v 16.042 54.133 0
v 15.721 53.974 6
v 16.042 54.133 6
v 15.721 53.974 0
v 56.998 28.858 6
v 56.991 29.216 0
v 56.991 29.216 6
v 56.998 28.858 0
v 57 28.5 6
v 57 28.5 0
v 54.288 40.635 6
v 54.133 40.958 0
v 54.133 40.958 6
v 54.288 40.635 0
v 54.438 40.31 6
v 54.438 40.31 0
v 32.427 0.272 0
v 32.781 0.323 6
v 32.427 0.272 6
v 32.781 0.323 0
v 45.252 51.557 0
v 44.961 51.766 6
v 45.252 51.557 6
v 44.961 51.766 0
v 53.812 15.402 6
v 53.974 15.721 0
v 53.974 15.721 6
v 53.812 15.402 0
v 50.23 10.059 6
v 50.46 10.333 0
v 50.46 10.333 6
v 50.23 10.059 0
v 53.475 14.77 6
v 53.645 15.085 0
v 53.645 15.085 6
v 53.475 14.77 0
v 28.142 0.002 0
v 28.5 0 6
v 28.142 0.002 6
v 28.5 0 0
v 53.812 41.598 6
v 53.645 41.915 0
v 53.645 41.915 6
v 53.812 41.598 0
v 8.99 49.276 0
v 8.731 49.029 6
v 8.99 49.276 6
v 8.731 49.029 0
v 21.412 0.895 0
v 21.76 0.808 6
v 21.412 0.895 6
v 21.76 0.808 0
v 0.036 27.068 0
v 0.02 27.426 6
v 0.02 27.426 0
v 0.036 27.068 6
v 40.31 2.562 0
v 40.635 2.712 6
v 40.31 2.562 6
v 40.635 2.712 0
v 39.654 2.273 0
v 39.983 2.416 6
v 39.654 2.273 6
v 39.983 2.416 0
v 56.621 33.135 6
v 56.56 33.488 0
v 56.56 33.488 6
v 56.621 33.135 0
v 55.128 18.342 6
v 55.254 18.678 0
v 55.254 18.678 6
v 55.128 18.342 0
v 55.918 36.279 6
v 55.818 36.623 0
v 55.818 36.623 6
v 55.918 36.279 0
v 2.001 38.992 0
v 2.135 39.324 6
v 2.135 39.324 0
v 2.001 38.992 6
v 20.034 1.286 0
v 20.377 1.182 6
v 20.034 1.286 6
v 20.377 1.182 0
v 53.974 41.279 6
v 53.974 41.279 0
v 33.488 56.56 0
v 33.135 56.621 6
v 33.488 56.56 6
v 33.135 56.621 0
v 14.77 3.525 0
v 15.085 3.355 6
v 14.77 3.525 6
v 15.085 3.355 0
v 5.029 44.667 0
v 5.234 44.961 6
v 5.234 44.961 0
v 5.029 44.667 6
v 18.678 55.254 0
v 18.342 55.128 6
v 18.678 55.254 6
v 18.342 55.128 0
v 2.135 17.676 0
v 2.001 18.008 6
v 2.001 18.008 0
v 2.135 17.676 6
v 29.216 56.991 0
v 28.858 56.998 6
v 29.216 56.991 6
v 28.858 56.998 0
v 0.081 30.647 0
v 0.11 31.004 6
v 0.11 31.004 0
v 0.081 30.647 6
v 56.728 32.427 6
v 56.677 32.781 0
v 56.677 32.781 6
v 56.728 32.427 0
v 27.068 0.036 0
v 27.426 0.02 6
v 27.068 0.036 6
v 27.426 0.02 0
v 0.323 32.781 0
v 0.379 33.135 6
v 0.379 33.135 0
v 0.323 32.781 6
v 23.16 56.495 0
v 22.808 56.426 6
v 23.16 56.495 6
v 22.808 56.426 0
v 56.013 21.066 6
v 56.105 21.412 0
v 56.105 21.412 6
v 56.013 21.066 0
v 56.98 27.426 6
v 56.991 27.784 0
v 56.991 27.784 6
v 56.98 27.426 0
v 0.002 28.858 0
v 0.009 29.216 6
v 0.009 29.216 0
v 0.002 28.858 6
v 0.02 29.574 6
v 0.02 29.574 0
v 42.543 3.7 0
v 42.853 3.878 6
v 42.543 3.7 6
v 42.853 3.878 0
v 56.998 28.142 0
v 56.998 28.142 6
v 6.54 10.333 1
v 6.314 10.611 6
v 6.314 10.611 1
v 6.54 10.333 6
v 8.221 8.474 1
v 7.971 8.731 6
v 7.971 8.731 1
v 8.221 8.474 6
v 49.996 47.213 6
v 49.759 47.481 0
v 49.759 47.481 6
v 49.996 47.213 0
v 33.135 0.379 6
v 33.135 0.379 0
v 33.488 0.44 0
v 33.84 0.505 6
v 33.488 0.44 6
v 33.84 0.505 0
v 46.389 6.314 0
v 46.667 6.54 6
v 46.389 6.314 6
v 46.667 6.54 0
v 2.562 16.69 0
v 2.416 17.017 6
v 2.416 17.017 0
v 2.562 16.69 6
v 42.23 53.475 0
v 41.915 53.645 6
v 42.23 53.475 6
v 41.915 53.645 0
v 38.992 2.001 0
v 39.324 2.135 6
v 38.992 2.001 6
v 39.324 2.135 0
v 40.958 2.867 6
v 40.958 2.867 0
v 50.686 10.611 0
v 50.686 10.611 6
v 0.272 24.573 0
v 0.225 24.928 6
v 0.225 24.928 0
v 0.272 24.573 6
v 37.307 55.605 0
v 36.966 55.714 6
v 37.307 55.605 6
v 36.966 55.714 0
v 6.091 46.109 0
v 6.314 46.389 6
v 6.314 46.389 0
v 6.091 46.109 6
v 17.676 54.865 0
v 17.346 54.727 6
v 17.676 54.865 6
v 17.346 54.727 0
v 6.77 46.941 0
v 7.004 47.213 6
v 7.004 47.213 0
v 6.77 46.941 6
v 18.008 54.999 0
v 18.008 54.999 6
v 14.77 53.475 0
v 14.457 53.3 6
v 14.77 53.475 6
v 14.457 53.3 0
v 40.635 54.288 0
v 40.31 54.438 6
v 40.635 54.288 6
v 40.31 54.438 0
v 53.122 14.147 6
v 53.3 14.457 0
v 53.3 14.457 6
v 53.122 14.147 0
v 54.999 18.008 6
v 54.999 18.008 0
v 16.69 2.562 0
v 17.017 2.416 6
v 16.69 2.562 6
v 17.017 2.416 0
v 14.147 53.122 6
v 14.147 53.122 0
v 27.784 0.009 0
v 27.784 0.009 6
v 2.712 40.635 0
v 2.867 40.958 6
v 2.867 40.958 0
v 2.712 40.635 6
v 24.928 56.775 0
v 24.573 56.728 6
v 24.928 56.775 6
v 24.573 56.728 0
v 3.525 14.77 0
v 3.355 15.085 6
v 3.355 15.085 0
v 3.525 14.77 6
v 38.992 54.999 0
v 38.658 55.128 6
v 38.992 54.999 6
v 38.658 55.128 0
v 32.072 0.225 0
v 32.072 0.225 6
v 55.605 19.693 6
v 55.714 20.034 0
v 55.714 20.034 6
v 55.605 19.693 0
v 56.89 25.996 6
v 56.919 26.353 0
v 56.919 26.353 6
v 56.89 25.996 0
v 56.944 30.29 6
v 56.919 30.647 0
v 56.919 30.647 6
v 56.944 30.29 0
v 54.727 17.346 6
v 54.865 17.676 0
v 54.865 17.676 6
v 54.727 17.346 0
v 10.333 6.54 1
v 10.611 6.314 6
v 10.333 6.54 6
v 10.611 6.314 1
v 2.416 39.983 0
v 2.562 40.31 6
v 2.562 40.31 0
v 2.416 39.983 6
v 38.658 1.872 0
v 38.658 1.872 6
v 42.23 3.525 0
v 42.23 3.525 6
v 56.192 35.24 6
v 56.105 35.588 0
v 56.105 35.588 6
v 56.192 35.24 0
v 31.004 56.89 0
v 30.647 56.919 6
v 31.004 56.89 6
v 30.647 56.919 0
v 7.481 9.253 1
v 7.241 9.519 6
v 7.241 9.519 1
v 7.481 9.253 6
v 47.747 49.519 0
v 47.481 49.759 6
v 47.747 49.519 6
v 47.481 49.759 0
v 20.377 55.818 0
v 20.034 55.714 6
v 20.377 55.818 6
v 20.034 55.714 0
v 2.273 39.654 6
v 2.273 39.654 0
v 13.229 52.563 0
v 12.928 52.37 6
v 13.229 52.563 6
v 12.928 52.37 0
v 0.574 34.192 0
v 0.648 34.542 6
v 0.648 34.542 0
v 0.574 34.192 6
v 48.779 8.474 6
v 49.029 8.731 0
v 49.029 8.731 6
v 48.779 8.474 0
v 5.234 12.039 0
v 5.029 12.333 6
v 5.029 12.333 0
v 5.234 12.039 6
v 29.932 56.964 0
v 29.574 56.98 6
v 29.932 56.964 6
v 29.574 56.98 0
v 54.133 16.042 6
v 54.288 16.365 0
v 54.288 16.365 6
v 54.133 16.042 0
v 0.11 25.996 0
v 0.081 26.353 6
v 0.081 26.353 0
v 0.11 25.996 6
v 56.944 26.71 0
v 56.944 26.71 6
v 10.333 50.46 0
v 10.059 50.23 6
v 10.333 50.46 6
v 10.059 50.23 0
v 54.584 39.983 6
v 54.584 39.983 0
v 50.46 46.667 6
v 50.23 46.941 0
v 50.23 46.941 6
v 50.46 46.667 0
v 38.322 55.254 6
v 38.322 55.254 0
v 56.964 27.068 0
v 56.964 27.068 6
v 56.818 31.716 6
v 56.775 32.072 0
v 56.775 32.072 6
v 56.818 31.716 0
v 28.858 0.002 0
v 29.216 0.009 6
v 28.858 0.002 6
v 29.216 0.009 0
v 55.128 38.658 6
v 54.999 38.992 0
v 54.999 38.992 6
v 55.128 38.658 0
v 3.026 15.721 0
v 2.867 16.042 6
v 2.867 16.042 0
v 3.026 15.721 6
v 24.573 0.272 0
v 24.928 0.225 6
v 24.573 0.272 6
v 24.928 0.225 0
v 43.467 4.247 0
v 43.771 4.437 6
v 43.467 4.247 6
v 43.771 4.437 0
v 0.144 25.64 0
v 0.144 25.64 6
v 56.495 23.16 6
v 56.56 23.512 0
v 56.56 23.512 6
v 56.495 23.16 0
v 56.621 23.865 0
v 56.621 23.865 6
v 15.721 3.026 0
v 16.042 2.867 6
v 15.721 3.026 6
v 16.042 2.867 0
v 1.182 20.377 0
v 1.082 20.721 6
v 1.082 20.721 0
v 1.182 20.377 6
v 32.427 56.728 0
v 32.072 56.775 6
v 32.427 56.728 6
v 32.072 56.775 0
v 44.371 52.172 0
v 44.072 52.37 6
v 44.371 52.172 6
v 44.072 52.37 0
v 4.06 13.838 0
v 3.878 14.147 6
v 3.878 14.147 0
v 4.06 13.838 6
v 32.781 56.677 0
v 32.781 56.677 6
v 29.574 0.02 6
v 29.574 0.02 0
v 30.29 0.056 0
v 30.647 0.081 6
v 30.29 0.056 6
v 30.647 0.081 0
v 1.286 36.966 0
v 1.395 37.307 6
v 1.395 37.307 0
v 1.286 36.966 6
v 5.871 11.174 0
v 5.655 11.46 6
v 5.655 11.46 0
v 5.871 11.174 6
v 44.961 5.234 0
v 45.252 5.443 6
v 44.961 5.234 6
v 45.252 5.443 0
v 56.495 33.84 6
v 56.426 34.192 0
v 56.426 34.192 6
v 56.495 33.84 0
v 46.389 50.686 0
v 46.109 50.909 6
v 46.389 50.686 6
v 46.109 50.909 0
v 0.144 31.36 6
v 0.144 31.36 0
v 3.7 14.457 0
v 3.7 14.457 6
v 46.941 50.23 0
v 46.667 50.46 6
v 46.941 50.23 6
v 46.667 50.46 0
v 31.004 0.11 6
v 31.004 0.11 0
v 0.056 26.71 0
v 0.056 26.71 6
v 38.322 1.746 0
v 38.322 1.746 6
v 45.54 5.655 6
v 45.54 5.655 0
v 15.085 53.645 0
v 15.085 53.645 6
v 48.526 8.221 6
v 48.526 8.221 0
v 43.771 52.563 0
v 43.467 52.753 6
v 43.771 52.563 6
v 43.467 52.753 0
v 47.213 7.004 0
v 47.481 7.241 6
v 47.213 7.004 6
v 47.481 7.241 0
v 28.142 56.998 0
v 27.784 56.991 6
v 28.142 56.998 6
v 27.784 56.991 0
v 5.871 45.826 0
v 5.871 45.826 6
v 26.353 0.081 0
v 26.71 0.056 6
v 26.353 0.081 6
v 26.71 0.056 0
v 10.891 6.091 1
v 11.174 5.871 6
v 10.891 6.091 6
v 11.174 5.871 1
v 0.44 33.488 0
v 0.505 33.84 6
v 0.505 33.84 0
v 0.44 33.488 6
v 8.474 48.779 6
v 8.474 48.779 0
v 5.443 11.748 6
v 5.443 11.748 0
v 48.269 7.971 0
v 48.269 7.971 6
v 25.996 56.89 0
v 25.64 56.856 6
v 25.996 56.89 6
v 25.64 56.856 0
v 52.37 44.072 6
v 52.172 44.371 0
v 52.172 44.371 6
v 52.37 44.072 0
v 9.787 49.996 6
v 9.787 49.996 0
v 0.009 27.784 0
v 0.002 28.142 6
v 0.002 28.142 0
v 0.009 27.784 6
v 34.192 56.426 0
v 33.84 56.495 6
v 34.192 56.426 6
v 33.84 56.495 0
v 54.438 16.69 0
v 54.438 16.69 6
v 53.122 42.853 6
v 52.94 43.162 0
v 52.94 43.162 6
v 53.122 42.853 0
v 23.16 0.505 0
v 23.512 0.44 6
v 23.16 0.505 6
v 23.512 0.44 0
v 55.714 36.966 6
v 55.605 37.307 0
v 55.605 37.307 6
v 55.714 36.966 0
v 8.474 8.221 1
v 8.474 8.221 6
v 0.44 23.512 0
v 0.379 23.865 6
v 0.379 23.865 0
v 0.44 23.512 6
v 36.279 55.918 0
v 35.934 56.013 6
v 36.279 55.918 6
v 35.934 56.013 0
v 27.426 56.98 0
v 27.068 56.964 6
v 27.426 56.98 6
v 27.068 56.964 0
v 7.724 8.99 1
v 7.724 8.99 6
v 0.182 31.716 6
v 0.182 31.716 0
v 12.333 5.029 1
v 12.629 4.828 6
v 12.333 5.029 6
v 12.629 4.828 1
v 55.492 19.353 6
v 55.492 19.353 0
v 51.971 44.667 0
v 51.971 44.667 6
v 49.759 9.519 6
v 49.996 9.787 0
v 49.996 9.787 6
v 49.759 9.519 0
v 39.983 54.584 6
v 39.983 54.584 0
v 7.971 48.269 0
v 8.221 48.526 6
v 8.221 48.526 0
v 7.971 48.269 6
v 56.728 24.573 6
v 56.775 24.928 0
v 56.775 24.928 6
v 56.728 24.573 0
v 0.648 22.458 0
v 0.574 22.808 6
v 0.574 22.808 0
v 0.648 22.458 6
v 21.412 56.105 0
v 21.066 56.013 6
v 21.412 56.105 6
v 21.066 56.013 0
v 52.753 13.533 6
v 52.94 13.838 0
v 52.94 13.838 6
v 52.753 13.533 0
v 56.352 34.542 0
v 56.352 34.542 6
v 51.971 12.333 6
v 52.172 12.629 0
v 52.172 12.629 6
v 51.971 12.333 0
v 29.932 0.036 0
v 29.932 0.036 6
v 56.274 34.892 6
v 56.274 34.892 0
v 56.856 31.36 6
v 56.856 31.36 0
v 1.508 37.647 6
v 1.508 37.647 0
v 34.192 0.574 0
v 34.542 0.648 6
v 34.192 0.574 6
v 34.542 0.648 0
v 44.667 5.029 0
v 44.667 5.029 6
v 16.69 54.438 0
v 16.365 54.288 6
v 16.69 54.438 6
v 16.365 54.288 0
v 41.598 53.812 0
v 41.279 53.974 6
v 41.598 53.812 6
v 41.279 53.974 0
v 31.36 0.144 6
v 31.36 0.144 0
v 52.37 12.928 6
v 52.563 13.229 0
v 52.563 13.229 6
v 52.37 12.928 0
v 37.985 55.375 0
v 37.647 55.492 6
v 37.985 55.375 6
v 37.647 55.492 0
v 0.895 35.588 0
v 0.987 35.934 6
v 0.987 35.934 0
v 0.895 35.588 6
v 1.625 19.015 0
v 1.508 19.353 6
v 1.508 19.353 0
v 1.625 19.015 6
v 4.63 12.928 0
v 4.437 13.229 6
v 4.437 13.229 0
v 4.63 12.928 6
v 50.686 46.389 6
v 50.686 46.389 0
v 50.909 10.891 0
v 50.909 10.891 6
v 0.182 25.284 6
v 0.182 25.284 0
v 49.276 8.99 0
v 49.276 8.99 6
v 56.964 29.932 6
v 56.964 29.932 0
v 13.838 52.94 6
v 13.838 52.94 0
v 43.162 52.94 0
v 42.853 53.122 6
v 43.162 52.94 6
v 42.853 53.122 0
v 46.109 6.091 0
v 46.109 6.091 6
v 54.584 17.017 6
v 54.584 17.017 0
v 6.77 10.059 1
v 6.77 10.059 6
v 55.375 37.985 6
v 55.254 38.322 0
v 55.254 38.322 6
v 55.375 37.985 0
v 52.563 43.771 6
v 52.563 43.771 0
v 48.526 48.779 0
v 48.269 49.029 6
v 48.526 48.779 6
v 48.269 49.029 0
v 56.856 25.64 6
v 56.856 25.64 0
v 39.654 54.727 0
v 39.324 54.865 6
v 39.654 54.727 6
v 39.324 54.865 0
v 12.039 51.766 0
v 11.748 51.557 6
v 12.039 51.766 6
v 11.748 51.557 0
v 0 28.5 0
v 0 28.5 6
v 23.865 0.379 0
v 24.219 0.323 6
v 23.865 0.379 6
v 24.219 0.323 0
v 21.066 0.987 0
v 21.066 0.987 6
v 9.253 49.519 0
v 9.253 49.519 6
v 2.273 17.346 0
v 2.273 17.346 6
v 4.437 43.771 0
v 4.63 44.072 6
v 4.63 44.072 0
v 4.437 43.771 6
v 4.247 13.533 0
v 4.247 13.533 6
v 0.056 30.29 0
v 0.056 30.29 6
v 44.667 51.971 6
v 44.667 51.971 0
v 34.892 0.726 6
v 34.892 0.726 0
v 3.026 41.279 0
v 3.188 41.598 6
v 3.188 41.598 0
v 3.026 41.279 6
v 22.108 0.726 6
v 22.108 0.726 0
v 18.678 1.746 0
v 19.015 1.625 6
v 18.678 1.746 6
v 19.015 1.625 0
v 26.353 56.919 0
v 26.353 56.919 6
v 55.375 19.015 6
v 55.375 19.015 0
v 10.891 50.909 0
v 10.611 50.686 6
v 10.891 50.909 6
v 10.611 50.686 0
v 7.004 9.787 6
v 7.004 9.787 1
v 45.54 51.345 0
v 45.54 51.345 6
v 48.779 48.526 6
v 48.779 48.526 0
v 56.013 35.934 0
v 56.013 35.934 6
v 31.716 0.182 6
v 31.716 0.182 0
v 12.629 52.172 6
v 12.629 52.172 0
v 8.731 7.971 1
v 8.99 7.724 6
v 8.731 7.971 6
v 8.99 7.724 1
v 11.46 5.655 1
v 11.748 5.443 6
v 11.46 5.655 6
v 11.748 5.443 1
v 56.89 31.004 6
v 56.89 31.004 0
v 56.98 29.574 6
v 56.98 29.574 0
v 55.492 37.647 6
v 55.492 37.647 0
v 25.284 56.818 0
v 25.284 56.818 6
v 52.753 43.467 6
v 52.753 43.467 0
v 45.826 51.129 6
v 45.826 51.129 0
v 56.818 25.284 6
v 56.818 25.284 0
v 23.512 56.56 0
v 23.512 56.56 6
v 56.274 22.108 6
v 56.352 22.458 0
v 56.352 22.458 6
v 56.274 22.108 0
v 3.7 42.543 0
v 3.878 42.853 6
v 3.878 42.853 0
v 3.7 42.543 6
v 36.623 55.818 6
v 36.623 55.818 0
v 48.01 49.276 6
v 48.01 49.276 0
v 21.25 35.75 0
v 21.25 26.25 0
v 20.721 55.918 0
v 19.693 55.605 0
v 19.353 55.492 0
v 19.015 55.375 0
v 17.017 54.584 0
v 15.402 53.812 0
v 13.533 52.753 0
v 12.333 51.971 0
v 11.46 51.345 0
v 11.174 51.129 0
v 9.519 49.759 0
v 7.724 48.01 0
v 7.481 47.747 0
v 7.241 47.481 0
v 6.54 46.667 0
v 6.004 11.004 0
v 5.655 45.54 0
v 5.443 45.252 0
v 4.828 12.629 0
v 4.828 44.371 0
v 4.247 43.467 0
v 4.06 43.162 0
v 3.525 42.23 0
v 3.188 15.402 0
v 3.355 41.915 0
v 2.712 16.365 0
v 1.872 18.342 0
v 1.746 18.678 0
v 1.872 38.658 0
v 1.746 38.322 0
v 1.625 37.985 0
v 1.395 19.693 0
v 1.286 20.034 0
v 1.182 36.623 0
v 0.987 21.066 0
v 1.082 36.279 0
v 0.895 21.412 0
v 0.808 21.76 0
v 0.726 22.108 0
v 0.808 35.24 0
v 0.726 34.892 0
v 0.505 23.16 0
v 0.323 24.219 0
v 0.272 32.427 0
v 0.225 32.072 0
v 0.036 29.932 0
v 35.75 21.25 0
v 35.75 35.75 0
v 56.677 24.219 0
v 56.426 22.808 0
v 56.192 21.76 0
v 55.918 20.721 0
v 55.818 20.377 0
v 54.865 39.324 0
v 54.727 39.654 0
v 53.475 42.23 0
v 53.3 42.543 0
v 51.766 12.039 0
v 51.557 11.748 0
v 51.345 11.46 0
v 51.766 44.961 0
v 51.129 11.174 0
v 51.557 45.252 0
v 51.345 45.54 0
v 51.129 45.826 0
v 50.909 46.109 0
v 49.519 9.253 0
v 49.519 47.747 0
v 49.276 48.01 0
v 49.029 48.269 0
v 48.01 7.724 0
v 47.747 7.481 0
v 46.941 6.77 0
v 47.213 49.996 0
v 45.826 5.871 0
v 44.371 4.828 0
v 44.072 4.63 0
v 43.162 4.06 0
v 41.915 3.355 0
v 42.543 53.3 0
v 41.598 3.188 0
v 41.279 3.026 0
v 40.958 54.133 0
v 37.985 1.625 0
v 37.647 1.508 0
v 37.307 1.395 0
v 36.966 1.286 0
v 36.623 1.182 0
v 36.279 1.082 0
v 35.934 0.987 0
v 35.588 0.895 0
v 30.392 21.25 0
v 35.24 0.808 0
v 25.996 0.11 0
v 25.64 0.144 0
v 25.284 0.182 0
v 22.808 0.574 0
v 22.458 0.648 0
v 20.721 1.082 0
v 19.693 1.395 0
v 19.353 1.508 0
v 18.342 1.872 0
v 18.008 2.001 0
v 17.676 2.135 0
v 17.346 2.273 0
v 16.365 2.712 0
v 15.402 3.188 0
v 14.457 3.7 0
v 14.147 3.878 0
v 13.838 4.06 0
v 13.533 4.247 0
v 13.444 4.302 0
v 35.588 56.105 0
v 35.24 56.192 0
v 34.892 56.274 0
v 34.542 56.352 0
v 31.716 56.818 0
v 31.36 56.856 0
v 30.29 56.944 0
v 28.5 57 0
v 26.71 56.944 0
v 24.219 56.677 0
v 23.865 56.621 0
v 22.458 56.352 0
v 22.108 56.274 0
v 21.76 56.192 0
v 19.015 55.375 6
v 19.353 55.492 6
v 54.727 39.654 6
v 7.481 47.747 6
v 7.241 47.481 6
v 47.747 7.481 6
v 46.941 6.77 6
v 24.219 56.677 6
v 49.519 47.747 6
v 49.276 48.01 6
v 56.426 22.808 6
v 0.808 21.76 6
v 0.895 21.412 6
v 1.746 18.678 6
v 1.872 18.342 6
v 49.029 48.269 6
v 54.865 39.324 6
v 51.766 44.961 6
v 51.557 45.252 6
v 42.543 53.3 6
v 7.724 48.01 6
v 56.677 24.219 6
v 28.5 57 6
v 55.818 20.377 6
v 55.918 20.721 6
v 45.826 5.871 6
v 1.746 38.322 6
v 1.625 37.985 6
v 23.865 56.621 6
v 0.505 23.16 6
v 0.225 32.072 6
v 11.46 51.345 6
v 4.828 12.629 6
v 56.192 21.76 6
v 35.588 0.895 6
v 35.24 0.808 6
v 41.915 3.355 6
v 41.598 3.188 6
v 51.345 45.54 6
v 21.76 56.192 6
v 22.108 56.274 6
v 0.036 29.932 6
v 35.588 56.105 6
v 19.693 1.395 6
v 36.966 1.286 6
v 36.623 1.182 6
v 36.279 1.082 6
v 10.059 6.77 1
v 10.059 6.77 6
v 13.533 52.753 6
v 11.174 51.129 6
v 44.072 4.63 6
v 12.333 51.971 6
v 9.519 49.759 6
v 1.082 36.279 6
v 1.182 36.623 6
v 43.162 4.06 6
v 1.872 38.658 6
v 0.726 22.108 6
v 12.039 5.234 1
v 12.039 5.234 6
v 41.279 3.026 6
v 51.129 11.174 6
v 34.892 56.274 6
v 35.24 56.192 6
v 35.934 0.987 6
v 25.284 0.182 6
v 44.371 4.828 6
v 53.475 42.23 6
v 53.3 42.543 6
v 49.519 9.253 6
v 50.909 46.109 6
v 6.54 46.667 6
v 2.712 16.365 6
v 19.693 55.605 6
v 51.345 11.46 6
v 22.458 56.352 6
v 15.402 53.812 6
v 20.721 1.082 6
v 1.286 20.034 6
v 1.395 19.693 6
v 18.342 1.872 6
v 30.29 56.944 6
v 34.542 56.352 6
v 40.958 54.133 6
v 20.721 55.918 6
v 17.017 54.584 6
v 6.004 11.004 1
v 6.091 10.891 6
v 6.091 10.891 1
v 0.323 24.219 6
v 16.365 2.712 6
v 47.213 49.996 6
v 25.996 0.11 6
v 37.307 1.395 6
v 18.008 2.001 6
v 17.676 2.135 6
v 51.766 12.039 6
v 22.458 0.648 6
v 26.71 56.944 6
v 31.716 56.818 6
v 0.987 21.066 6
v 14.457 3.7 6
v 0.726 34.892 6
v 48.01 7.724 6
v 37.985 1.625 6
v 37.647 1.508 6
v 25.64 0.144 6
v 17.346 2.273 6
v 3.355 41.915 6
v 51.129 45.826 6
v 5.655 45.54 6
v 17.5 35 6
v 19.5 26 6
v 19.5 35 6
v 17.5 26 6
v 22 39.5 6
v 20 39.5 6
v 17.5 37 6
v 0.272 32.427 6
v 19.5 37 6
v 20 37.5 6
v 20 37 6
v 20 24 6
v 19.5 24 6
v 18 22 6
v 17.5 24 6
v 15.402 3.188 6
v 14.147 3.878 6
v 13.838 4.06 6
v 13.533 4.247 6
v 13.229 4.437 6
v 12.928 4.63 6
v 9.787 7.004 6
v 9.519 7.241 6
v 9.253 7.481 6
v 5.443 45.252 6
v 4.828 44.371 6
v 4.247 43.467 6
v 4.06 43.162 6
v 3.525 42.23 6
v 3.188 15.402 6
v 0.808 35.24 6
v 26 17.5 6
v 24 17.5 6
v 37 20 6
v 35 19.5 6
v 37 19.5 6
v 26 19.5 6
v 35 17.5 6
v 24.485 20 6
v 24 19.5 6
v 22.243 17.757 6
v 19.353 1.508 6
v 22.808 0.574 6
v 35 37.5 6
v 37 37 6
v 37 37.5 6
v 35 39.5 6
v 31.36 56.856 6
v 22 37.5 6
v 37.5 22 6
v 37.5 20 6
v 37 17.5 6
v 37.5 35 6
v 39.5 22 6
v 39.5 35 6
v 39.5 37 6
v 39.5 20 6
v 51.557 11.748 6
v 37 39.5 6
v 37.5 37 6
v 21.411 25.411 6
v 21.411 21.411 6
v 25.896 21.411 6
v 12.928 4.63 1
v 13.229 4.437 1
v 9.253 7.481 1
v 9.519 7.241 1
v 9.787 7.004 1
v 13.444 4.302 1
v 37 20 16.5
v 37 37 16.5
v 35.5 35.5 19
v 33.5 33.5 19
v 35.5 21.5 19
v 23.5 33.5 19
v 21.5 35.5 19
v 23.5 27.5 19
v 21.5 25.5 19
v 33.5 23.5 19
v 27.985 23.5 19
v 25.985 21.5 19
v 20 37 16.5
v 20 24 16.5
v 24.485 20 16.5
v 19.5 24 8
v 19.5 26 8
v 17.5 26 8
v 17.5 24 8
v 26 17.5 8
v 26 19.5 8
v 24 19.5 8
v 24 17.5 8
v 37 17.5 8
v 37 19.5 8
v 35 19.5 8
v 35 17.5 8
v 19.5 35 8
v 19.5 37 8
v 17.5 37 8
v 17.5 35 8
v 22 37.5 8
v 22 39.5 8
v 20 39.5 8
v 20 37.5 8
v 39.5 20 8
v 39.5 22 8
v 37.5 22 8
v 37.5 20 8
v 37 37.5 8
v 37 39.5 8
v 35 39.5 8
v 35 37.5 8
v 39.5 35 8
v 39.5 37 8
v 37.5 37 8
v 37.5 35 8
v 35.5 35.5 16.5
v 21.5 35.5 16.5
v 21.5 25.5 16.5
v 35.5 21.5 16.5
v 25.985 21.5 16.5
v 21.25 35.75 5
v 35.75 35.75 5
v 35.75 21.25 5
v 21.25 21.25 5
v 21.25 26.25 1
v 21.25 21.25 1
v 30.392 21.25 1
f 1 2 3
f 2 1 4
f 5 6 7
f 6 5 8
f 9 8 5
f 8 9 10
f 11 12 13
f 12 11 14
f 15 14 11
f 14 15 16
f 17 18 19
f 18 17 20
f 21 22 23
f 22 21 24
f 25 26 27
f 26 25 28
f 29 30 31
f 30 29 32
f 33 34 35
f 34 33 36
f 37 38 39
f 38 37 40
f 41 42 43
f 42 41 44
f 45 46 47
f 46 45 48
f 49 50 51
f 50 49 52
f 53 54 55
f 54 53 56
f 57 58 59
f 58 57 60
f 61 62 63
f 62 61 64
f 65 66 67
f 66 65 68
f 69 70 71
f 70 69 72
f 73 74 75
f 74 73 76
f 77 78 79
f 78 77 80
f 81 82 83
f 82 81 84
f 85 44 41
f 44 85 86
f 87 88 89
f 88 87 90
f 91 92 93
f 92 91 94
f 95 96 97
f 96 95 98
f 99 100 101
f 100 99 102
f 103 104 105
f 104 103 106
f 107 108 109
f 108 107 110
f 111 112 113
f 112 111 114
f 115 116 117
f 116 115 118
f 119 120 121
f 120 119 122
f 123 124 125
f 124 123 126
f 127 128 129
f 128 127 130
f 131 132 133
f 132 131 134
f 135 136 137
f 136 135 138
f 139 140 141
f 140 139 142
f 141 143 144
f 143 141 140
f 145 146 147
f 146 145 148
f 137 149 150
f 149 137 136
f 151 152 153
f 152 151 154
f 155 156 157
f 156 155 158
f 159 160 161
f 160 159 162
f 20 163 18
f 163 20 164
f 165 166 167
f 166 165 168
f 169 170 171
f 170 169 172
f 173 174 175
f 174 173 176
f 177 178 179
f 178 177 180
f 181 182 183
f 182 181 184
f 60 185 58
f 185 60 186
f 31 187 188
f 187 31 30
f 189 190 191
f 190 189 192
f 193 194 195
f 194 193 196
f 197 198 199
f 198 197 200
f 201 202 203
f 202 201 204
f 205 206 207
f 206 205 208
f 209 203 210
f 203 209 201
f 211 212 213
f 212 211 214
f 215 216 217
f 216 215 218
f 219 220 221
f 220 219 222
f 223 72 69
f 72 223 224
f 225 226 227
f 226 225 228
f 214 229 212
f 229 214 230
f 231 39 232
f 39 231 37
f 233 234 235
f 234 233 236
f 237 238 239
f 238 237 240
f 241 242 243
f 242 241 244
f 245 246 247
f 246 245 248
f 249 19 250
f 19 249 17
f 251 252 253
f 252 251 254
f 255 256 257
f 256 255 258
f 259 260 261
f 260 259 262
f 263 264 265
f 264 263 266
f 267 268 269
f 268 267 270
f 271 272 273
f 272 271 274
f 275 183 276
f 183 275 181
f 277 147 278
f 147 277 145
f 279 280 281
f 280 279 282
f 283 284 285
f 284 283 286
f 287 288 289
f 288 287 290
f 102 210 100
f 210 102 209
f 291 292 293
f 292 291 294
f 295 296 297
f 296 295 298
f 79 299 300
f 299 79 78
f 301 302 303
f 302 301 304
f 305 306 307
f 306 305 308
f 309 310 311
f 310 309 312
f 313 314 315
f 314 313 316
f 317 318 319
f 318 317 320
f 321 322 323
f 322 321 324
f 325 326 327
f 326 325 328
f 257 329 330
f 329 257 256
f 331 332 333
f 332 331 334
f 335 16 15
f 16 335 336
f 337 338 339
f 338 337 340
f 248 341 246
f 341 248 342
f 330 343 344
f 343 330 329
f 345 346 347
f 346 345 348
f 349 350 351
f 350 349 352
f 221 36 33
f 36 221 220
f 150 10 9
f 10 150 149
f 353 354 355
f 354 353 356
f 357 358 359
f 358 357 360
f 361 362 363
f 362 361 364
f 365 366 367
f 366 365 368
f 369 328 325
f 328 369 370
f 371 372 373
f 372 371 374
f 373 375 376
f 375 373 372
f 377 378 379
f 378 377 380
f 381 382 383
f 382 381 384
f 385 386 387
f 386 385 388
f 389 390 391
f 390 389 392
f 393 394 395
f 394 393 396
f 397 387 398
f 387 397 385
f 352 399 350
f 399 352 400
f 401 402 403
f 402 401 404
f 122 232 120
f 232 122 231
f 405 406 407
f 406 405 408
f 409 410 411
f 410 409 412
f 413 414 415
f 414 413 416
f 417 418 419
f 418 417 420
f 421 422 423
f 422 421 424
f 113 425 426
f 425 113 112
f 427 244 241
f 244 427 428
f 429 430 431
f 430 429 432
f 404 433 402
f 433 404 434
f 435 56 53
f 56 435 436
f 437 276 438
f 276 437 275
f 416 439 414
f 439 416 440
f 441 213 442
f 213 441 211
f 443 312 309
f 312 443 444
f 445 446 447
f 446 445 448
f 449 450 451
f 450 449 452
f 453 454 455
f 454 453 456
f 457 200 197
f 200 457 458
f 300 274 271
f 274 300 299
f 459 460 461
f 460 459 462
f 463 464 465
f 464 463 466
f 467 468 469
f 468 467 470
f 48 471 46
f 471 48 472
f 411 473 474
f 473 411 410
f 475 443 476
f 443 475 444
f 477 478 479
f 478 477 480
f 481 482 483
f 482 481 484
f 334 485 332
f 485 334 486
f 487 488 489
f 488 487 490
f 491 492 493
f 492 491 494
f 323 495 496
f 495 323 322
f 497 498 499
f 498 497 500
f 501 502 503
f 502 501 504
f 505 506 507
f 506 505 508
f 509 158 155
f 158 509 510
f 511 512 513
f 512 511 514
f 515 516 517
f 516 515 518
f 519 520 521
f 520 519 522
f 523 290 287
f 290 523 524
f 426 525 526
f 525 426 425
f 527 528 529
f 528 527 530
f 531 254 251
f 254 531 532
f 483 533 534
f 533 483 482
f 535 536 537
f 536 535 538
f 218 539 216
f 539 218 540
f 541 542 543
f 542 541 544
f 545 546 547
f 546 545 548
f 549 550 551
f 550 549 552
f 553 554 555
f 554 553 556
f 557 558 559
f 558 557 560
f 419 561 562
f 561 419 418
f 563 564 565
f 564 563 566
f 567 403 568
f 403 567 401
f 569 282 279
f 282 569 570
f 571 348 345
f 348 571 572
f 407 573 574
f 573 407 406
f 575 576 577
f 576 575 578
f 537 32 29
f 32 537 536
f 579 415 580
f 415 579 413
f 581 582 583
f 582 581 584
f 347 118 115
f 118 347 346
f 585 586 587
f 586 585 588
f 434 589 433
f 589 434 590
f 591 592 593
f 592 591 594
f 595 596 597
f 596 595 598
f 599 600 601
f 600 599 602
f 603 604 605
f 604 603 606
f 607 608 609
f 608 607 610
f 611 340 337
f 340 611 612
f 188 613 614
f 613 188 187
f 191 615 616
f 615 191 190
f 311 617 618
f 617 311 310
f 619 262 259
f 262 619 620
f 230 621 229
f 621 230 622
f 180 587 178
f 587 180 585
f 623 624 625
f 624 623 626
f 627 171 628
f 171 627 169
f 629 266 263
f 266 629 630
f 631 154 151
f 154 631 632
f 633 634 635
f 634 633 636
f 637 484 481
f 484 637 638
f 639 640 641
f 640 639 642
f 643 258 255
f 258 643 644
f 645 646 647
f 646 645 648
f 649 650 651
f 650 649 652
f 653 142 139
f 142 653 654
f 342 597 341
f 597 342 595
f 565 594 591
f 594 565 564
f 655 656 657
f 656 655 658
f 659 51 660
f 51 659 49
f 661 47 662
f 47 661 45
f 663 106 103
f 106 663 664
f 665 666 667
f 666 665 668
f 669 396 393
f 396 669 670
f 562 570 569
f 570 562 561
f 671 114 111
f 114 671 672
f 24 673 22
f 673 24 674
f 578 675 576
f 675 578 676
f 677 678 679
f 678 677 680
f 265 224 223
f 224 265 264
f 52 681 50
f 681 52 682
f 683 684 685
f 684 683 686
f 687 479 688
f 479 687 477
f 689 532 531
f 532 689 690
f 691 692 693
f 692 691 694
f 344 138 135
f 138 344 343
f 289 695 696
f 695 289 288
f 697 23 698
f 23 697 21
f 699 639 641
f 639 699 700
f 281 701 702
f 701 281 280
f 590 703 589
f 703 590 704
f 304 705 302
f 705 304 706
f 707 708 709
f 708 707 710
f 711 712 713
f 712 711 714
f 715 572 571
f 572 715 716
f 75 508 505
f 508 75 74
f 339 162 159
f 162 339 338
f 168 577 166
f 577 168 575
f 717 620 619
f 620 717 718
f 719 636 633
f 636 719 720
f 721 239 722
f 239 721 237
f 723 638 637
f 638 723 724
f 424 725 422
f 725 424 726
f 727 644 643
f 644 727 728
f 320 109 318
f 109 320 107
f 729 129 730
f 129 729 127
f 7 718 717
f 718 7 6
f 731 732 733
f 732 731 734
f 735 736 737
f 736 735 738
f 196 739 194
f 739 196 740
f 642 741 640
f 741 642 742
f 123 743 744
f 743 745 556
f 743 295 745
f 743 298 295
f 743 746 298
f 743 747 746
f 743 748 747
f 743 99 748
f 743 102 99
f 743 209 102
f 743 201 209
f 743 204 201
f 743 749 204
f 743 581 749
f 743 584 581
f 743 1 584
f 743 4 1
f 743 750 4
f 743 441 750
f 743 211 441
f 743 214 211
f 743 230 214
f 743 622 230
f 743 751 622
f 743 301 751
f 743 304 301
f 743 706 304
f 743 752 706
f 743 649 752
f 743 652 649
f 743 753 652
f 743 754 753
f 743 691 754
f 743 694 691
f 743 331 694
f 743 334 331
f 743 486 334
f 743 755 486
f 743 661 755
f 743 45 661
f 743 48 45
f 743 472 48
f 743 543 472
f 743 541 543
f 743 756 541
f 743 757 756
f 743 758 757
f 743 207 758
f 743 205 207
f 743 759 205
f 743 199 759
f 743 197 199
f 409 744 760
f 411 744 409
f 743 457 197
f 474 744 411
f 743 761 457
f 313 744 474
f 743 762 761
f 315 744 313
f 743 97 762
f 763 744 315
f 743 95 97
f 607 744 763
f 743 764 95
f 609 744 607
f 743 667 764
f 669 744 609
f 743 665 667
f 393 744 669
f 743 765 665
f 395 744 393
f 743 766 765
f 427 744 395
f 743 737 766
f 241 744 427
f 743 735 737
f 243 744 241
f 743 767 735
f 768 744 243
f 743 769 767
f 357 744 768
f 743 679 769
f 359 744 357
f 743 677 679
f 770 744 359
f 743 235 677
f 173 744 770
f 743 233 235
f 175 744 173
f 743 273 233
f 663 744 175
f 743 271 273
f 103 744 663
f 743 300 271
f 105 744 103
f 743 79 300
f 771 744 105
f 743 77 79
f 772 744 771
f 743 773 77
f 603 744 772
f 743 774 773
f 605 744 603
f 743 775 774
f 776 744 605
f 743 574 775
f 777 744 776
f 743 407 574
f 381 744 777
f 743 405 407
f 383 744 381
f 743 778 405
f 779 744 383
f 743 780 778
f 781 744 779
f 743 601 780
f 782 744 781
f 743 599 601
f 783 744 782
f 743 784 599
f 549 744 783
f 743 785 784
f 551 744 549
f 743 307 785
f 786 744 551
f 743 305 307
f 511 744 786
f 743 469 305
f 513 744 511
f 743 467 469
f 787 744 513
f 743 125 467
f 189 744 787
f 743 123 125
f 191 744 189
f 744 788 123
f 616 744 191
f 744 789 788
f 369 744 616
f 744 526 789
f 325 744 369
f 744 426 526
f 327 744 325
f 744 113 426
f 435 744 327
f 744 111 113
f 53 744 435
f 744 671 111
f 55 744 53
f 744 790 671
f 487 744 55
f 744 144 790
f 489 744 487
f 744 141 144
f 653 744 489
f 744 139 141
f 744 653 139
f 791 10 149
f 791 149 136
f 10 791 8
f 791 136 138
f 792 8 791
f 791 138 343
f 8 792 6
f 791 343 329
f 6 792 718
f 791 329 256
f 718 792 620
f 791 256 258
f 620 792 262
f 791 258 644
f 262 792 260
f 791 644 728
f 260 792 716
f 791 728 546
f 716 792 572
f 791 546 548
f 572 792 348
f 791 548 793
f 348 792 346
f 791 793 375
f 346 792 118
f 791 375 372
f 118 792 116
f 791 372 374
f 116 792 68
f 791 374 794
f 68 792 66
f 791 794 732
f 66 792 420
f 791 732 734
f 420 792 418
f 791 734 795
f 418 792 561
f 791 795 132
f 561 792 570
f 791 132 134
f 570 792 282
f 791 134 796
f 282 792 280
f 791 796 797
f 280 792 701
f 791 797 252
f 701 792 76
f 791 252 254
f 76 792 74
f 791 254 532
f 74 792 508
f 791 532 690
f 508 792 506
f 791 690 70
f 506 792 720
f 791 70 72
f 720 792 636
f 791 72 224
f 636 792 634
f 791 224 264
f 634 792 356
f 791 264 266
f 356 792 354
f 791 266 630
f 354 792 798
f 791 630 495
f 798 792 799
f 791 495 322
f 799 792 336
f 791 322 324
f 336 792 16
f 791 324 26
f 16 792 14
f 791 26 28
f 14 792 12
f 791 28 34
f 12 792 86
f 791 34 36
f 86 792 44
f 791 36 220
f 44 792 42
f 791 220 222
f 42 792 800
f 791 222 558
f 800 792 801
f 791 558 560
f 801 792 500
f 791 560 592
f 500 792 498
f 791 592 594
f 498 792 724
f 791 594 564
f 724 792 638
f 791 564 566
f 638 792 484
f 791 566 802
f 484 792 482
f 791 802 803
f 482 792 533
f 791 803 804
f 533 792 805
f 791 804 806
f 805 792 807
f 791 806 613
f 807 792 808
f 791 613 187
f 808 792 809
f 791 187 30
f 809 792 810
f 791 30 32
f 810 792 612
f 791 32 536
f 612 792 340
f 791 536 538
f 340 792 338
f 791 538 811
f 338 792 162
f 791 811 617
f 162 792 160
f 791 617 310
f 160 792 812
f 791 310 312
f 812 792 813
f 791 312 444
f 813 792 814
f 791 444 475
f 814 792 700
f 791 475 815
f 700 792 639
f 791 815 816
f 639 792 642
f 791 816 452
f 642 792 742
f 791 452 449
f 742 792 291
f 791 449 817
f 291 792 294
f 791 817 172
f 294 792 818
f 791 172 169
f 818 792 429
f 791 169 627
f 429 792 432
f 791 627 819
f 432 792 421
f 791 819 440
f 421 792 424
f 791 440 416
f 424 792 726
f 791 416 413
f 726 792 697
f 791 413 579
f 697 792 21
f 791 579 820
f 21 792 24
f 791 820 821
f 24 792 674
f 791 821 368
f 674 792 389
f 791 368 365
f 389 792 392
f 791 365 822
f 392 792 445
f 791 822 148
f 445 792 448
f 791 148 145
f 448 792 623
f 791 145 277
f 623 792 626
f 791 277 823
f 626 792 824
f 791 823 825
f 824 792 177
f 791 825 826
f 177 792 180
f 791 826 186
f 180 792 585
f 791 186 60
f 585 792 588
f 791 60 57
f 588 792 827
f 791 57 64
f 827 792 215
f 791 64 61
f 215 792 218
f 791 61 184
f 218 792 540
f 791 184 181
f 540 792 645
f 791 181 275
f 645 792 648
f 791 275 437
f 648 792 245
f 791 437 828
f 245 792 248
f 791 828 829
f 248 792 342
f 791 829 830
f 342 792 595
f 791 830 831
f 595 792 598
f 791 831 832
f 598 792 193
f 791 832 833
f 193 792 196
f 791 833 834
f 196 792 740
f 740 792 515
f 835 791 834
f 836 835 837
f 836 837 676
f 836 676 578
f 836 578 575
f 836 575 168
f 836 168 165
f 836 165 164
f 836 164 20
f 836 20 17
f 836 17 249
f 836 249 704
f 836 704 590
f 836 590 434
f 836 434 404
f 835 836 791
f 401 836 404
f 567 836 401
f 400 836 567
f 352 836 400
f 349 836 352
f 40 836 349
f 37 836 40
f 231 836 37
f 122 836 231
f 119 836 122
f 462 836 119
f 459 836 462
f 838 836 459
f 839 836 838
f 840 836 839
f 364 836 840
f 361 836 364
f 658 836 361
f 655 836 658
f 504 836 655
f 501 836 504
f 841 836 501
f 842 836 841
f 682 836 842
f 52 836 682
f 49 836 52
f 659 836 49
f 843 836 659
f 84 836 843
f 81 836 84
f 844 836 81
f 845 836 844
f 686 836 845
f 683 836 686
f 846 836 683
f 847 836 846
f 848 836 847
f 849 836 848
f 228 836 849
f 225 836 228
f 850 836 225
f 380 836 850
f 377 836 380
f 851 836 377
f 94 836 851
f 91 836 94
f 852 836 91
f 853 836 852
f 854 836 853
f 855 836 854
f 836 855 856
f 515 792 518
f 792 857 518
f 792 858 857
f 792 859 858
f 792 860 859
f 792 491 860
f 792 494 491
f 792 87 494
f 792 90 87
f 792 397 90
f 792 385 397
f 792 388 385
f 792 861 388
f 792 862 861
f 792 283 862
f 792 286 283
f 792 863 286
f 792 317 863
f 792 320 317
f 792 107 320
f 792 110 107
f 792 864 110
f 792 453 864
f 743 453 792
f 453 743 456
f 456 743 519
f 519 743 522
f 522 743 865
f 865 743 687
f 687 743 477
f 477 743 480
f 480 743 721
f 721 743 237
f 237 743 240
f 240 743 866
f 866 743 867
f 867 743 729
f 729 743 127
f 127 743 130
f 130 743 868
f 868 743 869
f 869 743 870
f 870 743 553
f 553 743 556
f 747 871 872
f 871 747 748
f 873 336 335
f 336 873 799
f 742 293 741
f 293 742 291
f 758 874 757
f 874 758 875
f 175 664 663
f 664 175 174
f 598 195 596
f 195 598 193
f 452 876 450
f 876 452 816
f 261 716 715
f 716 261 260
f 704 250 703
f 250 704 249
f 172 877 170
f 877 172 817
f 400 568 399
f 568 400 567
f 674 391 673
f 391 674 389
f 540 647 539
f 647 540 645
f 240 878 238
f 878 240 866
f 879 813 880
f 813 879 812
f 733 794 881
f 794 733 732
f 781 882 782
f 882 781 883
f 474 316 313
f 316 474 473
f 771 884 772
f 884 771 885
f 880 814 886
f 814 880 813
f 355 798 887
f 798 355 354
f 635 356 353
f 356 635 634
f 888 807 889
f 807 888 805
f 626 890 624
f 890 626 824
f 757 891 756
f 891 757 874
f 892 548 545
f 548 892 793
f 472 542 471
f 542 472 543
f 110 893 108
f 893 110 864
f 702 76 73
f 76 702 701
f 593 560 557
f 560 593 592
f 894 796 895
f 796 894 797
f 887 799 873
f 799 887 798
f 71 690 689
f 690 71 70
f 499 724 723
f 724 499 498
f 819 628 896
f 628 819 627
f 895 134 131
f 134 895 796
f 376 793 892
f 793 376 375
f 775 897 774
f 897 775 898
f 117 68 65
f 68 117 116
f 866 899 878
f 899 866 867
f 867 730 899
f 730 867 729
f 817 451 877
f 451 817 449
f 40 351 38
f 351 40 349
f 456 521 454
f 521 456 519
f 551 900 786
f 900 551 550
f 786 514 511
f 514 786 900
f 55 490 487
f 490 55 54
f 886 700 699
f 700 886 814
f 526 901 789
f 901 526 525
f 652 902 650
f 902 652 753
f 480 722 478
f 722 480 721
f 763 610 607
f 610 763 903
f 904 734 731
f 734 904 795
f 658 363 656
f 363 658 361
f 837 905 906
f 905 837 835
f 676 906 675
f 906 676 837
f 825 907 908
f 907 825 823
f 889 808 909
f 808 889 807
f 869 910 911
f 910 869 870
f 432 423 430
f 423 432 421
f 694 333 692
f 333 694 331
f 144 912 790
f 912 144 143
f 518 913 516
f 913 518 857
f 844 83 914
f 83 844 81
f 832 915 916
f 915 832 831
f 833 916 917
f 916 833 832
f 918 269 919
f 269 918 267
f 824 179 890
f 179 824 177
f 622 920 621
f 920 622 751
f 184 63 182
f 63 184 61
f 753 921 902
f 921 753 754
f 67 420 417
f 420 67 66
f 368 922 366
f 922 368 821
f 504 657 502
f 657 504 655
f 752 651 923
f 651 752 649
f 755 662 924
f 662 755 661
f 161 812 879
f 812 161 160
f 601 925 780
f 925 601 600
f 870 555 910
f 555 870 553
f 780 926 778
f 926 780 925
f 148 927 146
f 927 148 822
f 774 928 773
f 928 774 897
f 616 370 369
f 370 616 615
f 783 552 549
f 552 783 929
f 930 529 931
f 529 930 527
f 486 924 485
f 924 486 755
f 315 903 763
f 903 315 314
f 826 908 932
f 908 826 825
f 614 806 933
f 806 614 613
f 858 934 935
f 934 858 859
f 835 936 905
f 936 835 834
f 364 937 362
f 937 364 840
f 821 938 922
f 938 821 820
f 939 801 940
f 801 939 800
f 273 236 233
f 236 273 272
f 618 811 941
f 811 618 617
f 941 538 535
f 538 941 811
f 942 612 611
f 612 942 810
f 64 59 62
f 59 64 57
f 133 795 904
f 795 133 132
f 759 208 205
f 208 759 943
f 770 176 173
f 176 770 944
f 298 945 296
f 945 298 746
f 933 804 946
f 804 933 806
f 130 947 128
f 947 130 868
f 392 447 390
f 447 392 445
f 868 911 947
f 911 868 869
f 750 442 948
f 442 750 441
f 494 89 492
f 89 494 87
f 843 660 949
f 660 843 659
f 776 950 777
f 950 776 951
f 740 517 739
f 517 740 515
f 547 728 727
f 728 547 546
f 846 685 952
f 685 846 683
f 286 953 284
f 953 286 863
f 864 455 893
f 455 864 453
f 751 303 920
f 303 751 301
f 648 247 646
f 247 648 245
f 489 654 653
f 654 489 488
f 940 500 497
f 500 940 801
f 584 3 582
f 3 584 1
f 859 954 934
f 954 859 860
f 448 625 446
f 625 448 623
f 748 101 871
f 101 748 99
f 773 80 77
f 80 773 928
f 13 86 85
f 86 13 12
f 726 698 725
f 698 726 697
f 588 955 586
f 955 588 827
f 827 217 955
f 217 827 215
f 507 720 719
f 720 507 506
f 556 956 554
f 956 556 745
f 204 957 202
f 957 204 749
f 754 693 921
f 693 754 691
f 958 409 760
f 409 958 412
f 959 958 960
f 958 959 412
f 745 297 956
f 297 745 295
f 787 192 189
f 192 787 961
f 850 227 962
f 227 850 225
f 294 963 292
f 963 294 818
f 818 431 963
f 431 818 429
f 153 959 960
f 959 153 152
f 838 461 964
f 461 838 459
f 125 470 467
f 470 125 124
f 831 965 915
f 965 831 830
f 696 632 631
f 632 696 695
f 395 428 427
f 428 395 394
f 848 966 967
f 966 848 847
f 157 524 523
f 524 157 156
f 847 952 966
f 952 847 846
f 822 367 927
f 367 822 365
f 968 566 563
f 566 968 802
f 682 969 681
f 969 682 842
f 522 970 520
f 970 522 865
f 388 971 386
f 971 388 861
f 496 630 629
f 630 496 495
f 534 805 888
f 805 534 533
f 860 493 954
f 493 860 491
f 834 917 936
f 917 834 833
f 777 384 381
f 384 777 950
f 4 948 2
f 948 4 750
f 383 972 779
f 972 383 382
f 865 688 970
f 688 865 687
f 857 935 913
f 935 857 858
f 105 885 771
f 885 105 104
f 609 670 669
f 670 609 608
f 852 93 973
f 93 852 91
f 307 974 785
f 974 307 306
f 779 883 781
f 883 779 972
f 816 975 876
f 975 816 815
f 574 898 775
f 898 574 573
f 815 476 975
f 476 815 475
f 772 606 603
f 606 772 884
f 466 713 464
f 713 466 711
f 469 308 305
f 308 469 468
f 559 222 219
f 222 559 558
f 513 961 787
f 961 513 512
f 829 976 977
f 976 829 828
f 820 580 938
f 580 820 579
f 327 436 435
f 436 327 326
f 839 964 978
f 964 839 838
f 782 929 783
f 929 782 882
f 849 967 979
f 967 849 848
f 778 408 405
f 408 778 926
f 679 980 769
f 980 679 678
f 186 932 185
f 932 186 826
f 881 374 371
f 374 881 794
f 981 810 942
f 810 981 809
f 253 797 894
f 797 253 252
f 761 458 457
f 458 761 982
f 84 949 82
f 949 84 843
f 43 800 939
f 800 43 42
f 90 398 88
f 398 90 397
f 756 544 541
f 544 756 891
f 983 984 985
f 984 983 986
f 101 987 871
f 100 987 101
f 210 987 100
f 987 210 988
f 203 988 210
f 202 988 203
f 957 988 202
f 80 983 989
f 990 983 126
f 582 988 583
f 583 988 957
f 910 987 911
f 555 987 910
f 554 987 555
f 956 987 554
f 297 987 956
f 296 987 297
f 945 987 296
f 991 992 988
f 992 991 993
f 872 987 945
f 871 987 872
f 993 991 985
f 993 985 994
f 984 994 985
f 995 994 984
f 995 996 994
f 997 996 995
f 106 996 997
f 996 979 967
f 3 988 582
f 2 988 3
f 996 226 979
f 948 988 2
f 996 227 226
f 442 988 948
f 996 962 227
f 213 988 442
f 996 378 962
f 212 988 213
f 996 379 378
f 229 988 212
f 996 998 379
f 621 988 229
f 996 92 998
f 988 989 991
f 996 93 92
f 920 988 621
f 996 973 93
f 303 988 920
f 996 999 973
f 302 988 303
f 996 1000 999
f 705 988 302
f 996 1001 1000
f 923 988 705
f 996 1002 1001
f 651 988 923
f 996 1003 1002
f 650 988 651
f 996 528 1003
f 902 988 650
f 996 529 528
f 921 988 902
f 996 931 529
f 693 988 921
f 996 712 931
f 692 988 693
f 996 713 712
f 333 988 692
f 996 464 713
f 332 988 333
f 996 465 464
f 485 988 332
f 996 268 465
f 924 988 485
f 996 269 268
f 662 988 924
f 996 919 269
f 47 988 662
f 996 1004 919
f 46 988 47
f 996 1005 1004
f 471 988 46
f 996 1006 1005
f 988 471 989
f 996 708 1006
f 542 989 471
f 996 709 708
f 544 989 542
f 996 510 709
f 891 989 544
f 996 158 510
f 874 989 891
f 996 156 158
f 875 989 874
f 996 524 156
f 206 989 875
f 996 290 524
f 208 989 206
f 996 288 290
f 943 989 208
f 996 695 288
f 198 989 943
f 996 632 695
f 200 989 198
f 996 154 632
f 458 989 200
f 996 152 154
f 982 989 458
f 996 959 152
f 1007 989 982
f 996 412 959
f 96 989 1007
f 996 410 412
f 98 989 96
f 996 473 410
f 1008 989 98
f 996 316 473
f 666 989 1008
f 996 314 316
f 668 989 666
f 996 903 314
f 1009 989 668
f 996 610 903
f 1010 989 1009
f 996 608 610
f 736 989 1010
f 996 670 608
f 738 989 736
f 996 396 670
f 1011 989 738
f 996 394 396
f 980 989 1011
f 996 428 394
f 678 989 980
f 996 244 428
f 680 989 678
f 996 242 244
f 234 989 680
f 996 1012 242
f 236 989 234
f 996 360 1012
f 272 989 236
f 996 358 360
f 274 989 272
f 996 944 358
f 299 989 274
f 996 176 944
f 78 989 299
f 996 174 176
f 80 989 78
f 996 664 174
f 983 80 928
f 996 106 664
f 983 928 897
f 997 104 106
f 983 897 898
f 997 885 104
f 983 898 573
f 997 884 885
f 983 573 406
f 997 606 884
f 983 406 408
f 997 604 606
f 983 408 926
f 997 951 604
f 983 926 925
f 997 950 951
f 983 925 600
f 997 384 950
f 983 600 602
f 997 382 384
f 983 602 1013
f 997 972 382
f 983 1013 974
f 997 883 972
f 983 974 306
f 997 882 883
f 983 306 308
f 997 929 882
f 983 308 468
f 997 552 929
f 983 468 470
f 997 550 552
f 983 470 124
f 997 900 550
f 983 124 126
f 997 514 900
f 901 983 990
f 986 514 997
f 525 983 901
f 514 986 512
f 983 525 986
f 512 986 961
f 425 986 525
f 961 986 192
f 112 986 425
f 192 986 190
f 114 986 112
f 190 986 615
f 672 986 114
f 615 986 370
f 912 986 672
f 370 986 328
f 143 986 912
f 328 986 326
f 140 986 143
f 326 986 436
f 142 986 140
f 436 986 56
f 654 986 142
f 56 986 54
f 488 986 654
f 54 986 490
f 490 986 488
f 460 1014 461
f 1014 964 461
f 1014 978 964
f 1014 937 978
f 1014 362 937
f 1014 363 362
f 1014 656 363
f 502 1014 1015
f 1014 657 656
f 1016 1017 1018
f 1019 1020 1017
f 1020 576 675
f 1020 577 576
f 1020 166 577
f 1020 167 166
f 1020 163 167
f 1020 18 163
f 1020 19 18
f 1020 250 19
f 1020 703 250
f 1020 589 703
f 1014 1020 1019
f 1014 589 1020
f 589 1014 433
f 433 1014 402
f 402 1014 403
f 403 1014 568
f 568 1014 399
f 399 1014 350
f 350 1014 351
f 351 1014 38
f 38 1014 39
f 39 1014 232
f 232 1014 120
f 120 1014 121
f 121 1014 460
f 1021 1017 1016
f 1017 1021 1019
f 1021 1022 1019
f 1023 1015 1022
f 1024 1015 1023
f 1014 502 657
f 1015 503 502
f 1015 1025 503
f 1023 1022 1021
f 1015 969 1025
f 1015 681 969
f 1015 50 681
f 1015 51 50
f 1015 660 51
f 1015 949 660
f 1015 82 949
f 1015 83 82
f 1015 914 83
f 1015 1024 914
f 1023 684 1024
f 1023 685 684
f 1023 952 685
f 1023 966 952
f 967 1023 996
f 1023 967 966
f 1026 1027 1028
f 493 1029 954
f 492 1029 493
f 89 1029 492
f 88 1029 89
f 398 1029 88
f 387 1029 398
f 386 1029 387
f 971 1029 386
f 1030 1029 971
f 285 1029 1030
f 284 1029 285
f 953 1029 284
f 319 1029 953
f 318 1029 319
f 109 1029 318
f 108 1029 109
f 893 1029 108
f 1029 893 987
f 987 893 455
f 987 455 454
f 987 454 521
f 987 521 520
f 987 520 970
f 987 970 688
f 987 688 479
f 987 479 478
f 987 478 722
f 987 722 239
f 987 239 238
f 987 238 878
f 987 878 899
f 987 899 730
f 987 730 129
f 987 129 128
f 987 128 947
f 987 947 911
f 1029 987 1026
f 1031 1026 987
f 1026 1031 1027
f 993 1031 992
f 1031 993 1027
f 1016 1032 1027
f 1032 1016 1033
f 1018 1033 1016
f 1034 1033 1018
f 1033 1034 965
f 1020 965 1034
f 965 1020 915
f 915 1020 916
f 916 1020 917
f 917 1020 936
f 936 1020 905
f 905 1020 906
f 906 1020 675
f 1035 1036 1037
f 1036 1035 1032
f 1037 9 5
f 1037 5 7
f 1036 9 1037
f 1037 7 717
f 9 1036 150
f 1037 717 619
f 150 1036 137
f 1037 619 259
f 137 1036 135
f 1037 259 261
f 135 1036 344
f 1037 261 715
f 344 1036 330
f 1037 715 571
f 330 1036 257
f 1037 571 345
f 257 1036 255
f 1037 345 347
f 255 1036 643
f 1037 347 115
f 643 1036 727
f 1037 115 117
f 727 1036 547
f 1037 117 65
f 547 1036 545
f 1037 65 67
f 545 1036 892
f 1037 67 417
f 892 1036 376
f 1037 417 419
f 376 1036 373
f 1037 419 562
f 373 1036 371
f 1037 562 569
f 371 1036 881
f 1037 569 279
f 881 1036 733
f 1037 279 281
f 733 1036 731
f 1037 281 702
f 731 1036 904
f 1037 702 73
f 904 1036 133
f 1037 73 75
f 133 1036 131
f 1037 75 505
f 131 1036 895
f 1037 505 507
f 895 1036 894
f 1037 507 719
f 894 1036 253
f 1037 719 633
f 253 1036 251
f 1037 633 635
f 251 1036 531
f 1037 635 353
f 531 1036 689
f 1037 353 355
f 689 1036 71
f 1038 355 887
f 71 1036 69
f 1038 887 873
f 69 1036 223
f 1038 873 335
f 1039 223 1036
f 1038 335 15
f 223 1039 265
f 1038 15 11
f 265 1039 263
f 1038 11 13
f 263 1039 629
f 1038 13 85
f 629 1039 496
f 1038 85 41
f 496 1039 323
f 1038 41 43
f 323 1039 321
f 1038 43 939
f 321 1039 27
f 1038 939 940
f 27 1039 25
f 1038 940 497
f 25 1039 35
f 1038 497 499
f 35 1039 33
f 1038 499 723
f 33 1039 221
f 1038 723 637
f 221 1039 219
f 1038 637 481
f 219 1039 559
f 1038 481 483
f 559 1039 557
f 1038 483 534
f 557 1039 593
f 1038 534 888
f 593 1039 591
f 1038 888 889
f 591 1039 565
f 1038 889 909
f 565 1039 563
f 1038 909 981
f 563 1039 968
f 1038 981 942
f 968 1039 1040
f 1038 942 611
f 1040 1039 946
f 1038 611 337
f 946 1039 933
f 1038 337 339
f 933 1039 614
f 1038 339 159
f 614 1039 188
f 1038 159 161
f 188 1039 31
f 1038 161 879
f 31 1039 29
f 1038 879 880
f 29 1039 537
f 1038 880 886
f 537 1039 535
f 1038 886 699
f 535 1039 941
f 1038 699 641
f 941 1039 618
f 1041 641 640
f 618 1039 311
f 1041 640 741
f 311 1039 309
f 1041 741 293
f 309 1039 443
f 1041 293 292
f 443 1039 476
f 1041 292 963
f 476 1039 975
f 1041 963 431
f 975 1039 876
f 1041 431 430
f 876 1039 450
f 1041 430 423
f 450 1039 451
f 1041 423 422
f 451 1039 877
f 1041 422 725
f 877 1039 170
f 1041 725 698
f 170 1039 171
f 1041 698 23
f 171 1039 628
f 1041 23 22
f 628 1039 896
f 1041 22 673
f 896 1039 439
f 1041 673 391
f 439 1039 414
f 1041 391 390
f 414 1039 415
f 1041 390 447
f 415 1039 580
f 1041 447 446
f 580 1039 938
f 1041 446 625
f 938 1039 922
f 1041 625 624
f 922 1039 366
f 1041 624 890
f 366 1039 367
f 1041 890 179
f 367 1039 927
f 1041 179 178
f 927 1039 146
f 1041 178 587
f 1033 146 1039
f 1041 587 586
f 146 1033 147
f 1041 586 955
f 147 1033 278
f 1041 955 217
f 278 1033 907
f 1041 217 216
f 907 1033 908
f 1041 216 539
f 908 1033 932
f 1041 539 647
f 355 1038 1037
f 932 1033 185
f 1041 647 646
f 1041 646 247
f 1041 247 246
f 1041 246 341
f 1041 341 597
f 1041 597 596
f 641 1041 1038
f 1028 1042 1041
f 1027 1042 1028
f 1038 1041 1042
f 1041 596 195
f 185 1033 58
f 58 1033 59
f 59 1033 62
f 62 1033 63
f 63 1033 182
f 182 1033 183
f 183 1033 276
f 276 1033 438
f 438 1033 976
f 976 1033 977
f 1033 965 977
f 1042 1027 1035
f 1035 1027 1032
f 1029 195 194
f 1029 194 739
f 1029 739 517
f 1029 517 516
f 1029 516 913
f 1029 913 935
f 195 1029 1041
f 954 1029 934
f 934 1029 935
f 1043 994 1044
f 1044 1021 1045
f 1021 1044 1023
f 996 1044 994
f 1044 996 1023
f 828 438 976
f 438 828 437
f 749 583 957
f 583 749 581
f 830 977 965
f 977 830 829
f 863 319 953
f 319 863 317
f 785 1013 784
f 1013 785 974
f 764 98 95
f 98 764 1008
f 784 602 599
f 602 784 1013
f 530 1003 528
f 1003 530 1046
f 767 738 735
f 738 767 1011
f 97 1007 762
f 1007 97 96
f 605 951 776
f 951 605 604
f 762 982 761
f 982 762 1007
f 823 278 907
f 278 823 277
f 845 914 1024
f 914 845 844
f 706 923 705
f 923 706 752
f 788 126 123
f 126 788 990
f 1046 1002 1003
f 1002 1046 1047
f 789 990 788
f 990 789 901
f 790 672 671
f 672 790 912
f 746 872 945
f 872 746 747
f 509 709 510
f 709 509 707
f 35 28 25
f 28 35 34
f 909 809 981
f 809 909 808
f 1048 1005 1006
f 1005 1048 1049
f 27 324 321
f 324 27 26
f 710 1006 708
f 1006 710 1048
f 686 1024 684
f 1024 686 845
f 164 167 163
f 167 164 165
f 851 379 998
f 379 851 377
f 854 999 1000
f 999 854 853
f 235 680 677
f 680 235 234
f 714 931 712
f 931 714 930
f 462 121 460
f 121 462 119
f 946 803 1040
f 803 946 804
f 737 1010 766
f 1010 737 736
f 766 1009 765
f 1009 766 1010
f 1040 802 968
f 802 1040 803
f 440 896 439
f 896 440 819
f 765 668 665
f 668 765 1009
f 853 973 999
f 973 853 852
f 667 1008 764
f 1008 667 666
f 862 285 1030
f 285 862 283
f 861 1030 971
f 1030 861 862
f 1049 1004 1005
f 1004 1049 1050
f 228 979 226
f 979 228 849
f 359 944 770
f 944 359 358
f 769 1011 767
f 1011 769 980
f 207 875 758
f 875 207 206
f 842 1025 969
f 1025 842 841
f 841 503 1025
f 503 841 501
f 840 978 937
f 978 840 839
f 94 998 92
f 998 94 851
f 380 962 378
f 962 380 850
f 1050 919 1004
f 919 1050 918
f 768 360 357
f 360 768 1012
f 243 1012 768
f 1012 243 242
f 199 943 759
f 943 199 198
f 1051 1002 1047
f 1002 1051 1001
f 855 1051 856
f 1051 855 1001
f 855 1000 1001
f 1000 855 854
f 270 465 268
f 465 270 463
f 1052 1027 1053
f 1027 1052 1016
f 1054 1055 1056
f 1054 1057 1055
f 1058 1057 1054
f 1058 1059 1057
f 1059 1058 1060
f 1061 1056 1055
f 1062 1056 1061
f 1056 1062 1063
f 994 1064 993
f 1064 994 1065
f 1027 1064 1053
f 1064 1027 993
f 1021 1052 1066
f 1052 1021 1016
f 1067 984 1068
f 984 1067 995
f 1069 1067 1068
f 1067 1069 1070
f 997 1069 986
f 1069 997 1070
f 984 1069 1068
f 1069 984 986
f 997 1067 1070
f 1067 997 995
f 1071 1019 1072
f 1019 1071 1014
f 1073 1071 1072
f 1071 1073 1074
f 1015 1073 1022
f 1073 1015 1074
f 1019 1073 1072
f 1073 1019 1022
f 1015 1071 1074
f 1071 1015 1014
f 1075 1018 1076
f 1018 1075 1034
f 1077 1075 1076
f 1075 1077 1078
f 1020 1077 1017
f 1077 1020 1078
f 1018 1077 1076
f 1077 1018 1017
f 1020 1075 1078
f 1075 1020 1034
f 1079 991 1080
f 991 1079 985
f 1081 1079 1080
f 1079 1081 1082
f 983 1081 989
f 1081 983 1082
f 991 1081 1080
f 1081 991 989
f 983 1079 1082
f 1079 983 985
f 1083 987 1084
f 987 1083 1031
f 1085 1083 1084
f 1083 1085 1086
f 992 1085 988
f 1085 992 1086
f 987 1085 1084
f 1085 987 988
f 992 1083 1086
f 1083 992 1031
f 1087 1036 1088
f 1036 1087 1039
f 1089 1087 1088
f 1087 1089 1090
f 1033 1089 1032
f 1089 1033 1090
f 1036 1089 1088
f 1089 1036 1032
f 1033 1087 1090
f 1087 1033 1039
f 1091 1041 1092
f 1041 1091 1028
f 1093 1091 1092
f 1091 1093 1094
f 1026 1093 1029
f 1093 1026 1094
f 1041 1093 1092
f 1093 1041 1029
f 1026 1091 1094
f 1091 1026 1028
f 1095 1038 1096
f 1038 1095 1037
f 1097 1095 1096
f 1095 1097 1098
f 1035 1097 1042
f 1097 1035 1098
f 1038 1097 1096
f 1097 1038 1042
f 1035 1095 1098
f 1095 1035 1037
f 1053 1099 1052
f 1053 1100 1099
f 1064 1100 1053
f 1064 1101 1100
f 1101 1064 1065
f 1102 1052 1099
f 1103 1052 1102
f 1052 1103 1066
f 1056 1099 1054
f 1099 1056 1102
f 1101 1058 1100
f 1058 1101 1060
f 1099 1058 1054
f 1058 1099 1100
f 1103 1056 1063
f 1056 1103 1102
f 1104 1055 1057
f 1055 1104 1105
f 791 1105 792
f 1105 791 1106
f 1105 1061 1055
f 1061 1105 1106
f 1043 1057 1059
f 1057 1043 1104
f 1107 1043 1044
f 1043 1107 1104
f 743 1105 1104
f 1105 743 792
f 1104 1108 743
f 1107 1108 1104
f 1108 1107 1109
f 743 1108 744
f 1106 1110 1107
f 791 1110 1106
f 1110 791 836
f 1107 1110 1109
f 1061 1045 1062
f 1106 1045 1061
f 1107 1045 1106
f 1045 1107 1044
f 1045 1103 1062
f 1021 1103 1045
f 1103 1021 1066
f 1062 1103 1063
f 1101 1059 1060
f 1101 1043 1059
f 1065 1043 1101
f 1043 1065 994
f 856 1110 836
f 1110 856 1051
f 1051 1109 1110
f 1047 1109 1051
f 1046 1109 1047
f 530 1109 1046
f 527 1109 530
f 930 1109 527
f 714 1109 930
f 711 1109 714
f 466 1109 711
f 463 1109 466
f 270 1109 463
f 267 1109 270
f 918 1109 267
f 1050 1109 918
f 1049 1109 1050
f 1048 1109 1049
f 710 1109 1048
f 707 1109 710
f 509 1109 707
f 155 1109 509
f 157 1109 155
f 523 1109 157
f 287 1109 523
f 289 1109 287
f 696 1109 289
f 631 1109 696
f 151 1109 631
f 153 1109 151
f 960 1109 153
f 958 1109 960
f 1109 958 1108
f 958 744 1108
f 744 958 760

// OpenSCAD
$fn=500;
width=17;
outerWidth=57;
wallWidth=2;
tabWidth=2;
hd=0.5; // holder distance

module centerCube()
{
	hull()
	{
		translate([2.25,2.25,18]) cube([10,10,1]);
		cube([14.5,14.5,5]);
	}
	
}


module mainCube()
{
	diff = outerWidth - width;
	offset = diff/2;
	innerWidth = width - (wallWidth*2);
	
	difference()
	{
		union()
		{
			translate([outerWidth/2,outerWidth/2,0]) cylinder(d=outerWidth,6);
			color("blue") translate([offset,offset,0]) cube([width,width,19]);
			translate([offset - tabWidth - hd,offset + (wallWidth*2),0 ])cube([tabWidth,tabWidth,8]);
			translate([offset + (wallWidth*2),offset - tabWidth - hd,0 ])cube([tabWidth,tabWidth,8]);
			translate([offset + width - tabWidth, offset - tabWidth - hd,0]) cube([tabWidth,tabWidth,8]);
			translate([offset - tabWidth - hd,offset + width - tabWidth,0]) cube([tabWidth,tabWidth,8]);
			translate([offset,offset + width + hd,0]) cube([tabWidth,tabWidth,8]);
			translate([offset + width + hd,offset,0]) cube([tabWidth,tabWidth,8]);
			translate([offset + width - tabWidth,offset + width + hd,0]) cube([tabWidth,tabWidth,8]);
			translate([offset + width + hd,offset + width - tabWidth,0]) cube([tabWidth,tabWidth,8]);
			
		}
		
		
		translate([offset+1.25,offset+1.25,0]) centerCube();
		translate([offset-wallWidth,offset+(wallWidth),6]) rotate([0,0,-45]) cube([wallWidth*3,wallWidth*5,15]);
		translate([offset,offset,16.5]) difference()
		{
		cube([width,width,3]);
		translate([wallWidth-0.5, wallWidth-0.5,0]) cube([width-(wallWidth*2)+1,width-(wallWidth*2)+1,3]);
		}
		translate([-5,0,0]) rotate([0,0,-45]) cube([10,45,1]);
		
	}
	
}

mainCube();
